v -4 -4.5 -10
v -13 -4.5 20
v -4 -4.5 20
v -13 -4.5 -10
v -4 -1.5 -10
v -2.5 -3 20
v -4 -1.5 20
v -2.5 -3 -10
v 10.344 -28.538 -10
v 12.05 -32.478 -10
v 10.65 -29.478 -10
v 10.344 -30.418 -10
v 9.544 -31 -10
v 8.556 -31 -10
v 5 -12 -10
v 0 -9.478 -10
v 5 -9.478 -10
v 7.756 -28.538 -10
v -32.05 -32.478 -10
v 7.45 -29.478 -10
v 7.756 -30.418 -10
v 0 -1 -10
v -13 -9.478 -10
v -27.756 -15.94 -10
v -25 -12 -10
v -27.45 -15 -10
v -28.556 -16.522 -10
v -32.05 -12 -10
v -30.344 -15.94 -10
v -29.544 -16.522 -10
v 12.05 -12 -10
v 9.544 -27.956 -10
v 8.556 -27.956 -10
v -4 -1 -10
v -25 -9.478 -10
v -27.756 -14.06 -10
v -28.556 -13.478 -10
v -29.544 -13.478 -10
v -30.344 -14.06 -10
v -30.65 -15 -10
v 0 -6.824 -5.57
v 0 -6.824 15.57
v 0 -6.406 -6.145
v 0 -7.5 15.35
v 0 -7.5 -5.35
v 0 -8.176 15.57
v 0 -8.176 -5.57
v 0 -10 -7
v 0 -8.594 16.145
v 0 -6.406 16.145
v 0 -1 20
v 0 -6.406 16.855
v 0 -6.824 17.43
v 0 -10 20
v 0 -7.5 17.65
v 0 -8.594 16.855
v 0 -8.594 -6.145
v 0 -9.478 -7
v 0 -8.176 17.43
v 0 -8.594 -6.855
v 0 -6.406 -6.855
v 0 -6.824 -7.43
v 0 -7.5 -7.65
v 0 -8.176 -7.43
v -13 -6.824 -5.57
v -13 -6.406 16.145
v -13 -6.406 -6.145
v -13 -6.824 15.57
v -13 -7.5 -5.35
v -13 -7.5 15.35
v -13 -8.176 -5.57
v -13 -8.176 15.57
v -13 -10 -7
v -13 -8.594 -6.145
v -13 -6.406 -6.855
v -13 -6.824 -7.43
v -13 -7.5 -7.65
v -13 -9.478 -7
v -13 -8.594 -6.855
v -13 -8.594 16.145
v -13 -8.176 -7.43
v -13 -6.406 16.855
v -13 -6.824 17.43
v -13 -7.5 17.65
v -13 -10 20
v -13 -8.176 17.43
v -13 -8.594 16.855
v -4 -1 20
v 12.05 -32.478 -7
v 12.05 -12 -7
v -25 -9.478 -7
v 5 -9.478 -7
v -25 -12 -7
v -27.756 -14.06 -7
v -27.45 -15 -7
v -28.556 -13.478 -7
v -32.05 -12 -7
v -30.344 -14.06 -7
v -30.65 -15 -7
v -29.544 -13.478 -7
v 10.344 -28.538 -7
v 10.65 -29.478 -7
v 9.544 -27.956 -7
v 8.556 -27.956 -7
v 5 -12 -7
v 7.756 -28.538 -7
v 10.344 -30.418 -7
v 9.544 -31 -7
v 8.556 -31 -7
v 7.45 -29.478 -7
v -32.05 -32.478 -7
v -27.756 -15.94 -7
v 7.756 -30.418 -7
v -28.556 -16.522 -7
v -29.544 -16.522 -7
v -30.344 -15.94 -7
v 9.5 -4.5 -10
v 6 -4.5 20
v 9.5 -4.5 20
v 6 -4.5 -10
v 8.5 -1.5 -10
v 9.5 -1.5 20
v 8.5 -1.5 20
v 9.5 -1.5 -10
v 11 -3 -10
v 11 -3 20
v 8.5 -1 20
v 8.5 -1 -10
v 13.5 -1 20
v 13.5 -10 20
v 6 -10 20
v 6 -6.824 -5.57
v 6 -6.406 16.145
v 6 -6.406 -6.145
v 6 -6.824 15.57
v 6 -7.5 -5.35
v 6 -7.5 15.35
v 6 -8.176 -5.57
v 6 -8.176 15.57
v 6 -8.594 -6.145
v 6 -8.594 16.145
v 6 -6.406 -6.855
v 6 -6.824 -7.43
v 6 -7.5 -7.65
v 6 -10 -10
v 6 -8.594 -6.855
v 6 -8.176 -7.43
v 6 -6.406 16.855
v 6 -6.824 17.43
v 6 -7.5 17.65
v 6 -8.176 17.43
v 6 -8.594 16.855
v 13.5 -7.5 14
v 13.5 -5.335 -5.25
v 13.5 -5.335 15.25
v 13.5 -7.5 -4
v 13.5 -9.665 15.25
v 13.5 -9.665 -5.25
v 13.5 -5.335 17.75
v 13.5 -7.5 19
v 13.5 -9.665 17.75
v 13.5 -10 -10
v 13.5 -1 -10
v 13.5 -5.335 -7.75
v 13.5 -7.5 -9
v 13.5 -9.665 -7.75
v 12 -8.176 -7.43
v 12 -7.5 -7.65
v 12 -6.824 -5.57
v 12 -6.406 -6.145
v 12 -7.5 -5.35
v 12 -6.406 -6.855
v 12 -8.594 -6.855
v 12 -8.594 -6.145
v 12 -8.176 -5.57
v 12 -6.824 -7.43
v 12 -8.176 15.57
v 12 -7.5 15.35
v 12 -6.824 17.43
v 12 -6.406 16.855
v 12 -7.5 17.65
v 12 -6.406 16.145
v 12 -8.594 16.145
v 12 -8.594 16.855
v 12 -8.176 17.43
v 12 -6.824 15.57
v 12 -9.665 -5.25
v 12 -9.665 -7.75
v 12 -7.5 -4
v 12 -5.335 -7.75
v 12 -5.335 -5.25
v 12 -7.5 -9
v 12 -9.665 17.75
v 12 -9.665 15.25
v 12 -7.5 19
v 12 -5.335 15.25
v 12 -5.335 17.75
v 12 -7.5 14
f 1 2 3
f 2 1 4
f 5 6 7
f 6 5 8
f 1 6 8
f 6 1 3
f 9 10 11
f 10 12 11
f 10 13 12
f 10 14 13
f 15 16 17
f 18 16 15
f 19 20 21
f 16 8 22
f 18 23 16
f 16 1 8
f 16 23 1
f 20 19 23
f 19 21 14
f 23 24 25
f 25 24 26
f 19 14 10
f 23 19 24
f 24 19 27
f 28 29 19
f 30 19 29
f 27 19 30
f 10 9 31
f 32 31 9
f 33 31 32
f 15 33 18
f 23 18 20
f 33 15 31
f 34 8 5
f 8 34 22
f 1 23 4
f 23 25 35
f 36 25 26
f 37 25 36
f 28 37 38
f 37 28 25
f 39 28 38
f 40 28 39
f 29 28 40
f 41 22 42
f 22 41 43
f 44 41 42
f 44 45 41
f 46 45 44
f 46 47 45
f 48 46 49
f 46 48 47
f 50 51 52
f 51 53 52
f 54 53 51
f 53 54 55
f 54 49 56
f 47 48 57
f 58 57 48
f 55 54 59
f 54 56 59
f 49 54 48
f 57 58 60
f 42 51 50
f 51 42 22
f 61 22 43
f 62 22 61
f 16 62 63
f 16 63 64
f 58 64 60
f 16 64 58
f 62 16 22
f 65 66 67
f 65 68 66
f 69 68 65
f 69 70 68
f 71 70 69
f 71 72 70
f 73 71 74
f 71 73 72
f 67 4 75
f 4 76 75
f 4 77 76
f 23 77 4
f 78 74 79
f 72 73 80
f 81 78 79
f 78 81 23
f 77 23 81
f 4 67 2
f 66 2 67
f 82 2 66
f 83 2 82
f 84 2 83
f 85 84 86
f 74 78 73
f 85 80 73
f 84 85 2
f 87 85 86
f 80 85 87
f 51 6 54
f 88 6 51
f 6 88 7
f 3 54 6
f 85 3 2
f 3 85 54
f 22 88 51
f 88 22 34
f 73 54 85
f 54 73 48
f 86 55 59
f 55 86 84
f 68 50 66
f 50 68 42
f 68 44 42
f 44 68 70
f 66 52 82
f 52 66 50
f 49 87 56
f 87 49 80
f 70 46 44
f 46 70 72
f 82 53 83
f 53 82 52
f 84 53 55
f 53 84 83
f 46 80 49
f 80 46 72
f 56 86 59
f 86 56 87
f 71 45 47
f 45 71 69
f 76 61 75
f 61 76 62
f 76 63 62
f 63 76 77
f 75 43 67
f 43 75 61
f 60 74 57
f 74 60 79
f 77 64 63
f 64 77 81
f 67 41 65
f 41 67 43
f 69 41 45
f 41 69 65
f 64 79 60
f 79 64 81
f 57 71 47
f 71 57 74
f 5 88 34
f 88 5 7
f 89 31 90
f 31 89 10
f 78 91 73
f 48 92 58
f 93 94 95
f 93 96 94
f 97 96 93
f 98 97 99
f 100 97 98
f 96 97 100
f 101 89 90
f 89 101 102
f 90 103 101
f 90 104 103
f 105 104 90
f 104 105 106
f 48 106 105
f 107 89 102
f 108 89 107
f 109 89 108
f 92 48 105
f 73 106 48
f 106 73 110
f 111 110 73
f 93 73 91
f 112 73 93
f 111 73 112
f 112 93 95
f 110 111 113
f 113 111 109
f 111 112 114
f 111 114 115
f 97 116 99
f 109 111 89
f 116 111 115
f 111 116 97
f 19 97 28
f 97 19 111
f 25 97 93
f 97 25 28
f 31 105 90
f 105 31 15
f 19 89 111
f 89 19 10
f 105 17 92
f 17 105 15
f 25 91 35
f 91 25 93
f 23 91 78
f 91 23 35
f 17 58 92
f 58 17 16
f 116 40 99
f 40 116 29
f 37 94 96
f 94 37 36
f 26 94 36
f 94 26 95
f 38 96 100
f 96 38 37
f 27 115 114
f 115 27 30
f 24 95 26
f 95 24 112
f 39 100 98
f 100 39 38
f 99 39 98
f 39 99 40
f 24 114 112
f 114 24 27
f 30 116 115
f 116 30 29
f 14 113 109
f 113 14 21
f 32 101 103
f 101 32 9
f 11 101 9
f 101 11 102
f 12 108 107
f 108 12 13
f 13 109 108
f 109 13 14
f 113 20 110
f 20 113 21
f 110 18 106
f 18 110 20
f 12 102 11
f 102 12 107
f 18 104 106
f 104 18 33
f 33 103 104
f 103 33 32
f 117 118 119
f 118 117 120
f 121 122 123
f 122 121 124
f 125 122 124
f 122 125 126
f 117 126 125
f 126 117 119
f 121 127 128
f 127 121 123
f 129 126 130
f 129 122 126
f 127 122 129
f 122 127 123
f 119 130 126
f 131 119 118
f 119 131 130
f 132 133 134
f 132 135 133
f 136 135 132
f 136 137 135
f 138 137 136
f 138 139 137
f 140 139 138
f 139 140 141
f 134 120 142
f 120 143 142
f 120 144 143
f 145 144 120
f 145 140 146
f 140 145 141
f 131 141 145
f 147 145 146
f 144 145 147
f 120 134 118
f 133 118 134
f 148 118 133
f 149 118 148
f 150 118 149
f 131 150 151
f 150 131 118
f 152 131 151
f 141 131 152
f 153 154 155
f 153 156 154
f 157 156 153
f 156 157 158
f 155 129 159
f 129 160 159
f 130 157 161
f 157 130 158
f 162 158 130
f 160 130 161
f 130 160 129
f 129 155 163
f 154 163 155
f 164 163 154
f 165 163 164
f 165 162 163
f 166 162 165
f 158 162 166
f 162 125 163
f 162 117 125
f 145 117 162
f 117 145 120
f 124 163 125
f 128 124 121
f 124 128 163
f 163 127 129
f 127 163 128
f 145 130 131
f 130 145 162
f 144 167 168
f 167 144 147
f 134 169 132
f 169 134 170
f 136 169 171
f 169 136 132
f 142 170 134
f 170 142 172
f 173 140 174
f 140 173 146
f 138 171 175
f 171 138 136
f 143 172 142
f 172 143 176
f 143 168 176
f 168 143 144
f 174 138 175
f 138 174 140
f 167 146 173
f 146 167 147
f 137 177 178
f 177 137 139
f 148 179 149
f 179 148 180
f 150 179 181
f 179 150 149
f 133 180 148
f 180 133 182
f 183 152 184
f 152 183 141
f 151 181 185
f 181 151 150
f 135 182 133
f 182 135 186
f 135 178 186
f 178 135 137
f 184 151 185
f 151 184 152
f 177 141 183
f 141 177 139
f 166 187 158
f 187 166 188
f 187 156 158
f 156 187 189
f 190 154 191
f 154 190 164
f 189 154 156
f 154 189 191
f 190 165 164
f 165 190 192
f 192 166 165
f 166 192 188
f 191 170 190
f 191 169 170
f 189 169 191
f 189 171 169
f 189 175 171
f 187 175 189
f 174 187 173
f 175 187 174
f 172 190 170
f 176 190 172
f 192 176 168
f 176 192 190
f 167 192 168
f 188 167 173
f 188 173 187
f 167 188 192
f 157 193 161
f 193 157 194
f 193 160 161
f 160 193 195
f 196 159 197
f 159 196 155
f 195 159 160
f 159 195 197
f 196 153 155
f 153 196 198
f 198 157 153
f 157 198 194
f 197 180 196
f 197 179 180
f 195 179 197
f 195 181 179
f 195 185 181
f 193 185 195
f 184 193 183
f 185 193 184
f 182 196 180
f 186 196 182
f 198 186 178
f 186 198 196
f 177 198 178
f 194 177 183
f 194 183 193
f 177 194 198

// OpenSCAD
// file: lib/railSystem.scad
module rail($length, $spacing = true){
    $height = 15;
    $partWidth = 5;
    
    translate([0,-3,0]){
        difference(){
            translate([0,-1.5,-$height/2]) cube([$length,3,$height]);
            translate([0,0,$height/2])rotate([-45,0,0])cube([$length,10,10]);
            mirror([0,1,0])translate([0,0,$height/2])rotate([-45,0,0])cube([$length,10,10]);   
           
            translate([0,0,-$height/2])rotate([-45,0,0])cube([$length,10,10]);
            mirror([0,1,0])translate([0,0,-$height/2])rotate([-45,0,0])cube([$length,10,10]);  
            
            
    if($spacing)        
         for(i = [$partWidth : $partWidth * 2 : $length]){
            rotate([180,0,0])translate([i,0.5,-$height/2])cube([$partWidth,50,$height]);
        }
            
        }
        

        
        translate([0,0,-$height*1/(1.5*2)])cube([$length,3,$height/1.5]);
    }
}


module railMount($width, $onlyPart = 0){
    difference(){
        union(){
    
            if($onlyPart!=1)translate([0,-10,-3])cube([$width,9,13]);
            if($onlyPart!=2)translate([0,-10,-11.5])cube([$width,9,7.5]);
        }
    
    translate([-1,0,0])rail($width + 2, false);
    translate([-1,0,-1.5])rail($width + 2, false);
        
    translate([3.5,-7.5,-15])
        cylinder(d=2.3,50, $fn=10);
    translate([$width - 3.5,-7.5,-15])
        cylinder(d=2.3,50, $fn=10);
    translate([3.5,-7.5,-11.6])cylinder(d=5,1.6,$fn=6);
    translate([$width - 3.5,-7.5,-11.6])cylinder(d=5,1.6,$fn=6);
            
    translate([-1,-2,-6])cube([$width + 2,2,12]);
    }
}
// main file
include <lib/railSystem.scad>;

module sonarMount(){
    rotate([0,90,0])
    translate([-20,0,-10])railMount(30,2);

    translate([-38.1/2 -10, -14.478 - 15, -10])
    difference(){
        union(){
            translate([-3,-3,0])cube([38.1 + 6,14.478 + 6,3]);
            translate([38.1/2 - 15,10,0])cube([30,10,3]);
            //cylinder(d=5.5,6,$fn=10);
            //translate([38.1,14.478,0])cylinder(d=5.5,6,$fn=10);
        }
        translate([0,14.478,0])cylinder(d=3.2,20,$fn=10);
        translate([38.1,0,0])cylinder(d=3.2,20,$fn=10);
    }
    
    translate([2,0,-10])
    rotate([0,-90,0])railMount(30,1);
}

sonarMount();
